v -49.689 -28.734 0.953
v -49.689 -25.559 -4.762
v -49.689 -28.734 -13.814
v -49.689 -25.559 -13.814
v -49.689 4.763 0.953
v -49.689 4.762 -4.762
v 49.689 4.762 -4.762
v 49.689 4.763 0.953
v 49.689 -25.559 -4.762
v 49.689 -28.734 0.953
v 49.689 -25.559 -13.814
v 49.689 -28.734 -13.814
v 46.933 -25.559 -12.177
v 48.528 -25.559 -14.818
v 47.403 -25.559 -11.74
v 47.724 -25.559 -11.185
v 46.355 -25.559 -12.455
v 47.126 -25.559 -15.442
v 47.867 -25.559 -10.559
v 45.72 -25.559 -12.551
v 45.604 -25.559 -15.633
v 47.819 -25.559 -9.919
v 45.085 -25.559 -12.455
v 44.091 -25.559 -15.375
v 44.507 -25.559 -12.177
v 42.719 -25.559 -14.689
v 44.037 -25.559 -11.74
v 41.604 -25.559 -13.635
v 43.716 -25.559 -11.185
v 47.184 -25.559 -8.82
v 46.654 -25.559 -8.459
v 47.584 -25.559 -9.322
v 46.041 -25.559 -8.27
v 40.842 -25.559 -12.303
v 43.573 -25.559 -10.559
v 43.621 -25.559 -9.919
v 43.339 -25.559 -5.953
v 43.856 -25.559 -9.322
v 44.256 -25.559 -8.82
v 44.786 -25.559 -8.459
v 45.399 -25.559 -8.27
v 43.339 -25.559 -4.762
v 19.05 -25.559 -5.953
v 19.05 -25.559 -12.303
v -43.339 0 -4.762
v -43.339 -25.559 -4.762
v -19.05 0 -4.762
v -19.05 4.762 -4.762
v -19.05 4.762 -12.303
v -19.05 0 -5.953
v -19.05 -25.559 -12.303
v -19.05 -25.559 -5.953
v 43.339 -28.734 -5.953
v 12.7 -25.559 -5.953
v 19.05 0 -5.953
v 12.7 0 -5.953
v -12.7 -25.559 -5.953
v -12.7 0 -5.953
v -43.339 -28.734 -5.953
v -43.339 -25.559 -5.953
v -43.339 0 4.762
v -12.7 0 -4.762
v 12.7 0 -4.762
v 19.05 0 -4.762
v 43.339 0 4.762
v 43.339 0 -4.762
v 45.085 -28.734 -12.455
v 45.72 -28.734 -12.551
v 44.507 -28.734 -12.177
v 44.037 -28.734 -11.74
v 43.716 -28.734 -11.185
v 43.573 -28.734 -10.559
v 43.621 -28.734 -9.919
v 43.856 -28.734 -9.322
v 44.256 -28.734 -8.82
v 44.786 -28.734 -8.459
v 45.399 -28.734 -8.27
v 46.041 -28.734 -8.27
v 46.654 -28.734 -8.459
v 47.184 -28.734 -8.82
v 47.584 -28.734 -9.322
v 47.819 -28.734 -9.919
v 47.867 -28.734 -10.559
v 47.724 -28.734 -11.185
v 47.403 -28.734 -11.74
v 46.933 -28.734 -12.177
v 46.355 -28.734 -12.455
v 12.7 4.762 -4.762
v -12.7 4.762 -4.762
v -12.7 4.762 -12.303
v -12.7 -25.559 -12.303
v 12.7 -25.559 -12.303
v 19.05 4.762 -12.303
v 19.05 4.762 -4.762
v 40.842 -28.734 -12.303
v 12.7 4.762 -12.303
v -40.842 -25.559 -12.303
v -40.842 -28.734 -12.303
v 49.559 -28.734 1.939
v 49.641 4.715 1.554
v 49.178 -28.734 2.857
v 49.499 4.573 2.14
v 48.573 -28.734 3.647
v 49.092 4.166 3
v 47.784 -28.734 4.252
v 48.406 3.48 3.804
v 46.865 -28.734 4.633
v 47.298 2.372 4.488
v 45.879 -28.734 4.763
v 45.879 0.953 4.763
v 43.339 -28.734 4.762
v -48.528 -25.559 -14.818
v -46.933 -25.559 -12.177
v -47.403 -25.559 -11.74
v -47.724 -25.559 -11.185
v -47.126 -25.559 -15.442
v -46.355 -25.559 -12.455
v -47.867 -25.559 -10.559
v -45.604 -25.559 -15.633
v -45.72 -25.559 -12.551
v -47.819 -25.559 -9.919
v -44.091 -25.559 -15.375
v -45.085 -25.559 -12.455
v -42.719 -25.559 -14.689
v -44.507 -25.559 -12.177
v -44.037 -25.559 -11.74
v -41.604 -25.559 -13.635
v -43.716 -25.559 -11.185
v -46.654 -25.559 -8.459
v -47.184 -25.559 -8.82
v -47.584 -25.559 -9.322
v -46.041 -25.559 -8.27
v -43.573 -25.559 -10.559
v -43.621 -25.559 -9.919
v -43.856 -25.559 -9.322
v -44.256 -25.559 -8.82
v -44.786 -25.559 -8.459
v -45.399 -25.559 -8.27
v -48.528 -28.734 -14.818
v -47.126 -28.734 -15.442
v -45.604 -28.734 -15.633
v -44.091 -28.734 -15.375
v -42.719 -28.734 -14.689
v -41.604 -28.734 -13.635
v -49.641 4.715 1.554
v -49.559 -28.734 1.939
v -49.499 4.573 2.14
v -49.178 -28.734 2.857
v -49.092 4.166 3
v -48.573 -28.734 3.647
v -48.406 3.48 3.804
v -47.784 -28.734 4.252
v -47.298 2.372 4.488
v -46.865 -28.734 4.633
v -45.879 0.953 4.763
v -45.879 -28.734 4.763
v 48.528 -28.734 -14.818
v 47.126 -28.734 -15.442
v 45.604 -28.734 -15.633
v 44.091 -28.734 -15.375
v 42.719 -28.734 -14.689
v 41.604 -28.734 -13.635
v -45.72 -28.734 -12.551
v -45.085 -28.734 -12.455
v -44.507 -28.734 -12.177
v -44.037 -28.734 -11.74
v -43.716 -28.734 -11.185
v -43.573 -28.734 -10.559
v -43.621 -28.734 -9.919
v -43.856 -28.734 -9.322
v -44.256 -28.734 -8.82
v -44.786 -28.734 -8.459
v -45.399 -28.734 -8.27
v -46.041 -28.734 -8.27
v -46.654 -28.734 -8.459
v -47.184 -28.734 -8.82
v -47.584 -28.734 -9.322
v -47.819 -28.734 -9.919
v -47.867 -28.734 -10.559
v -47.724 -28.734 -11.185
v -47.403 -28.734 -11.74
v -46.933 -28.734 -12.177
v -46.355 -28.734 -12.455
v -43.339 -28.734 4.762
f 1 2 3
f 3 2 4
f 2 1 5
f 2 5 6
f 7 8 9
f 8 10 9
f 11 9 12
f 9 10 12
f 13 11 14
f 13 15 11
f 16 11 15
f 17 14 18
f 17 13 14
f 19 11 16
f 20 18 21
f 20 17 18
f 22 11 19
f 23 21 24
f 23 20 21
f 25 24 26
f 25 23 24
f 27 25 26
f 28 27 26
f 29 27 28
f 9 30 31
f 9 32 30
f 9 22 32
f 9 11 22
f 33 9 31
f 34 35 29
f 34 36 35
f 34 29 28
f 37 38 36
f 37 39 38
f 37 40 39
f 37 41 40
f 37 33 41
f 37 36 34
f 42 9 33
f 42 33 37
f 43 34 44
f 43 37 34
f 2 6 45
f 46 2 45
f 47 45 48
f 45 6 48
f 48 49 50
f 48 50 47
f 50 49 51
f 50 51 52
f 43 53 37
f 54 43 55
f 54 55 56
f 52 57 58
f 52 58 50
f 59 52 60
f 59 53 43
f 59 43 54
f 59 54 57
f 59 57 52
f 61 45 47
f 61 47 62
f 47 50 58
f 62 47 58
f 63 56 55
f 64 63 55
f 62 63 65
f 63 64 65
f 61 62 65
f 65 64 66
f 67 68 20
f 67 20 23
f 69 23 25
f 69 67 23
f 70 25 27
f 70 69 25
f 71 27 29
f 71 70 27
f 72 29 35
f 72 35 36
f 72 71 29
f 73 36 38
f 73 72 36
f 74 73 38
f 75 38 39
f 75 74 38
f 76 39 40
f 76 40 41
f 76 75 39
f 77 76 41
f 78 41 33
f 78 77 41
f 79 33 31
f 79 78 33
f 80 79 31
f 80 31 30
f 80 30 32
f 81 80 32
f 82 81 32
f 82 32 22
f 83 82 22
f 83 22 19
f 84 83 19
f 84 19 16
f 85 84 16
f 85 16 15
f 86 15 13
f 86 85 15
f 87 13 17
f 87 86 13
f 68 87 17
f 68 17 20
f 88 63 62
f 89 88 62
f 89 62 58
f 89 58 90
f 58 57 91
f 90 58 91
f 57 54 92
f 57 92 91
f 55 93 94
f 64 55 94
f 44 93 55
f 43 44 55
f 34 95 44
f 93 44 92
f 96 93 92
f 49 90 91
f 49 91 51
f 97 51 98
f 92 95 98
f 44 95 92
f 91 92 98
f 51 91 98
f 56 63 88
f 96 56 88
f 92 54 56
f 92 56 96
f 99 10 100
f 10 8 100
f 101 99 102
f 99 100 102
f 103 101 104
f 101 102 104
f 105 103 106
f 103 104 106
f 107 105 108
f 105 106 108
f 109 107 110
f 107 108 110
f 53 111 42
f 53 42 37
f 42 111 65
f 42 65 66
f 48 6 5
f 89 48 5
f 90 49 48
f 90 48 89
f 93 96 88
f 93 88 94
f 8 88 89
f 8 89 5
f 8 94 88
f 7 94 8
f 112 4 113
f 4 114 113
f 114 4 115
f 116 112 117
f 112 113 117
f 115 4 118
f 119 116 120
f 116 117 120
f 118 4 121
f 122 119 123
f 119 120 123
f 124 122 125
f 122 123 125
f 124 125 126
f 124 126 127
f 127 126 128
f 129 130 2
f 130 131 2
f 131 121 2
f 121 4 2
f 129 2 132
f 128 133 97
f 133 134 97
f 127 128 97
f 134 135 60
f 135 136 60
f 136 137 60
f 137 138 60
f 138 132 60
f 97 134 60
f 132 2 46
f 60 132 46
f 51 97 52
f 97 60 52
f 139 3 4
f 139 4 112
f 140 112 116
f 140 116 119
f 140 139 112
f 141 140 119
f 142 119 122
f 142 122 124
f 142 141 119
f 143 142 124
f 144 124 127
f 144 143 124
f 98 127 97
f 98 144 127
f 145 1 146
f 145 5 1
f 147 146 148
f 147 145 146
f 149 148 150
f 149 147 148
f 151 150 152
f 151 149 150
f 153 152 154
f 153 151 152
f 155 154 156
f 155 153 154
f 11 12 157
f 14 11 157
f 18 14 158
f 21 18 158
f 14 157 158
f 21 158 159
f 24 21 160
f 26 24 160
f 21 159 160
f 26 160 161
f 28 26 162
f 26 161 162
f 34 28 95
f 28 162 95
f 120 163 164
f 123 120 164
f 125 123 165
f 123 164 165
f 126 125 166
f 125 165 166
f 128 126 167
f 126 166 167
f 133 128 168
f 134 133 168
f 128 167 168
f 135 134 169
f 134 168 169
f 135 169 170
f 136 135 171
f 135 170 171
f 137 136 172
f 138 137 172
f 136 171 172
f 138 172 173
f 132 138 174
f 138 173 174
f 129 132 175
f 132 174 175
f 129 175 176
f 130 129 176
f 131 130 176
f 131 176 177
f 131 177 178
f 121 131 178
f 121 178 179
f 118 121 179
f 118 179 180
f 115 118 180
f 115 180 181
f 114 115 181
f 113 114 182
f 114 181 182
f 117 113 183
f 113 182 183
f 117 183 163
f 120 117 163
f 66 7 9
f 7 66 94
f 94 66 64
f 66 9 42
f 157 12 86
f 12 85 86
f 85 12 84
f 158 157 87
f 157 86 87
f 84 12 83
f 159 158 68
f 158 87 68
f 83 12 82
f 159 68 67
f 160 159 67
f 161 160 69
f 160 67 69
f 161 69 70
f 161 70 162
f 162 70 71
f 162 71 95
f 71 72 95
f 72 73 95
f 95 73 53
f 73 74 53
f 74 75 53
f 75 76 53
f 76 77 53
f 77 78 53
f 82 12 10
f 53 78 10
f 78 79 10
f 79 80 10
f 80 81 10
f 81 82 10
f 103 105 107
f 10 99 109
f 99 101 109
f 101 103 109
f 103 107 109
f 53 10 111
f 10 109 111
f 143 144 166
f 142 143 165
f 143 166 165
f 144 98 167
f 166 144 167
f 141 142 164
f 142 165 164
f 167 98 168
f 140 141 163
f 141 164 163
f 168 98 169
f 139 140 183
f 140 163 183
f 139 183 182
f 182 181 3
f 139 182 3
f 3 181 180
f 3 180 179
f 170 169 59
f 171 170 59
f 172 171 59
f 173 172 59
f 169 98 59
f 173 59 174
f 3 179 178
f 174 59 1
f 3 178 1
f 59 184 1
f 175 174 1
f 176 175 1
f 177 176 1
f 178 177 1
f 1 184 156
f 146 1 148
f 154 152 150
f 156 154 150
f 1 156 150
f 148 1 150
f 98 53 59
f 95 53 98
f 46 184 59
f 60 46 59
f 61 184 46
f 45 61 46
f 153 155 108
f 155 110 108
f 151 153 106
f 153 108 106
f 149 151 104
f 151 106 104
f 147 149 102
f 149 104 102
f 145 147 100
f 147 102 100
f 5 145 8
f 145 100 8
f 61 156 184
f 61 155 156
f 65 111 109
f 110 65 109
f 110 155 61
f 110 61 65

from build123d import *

# Parameters (mm, degrees)
BOSS_EXTRUDE1_DEPTH = 4.7625
SKETCH1_3_W         = 6.35
SKETCH1_3_H         = 9.525
SKETCH1_3_H_2       = 6.35
BOSS_EXTRUDE2_DEPTH = 28.73375
SKETCH2_W           = 12.7
SKETCH2_H           = 6.35
SKETCH2_R           = 2.15265
BOSS_EXTRUDE3_DEPTH = 3.175
FILLET11_R          = 3.81


with BuildPart() as part:
    # Sketch1 → Boss-Extrude1 (new body)
    with BuildSketch(Plane(origin=(0, 0, 0), x_dir=(1, 0, 0), z_dir=(0, 1, 0))):
        Polygon((-49.68875, 4.7625), (-49.68875, -4.7625), (49.68875, -4.7625), (49.68875, 4.7625), (-12.7, 4.7625), (-12.7, 12.303125), (-19.05, 12.303125), (-19.05, 4.7625), align=None)
    extrude(amount=BOSS_EXTRUDE1_DEPTH)

    # Sketch1<3> → Boss-Extrude2 (add)
    with BuildSketch(Plane(origin=(0, 0, 0), x_dir=(1, 0, 0), z_dir=(0, 1, 0))):
        with Locations((-46.51375, 0)):
            Rectangle(SKETCH1_3_W, SKETCH1_3_H)
        with Locations((46.51375, 0)):
            Rectangle(SKETCH1_3_W, SKETCH1_3_H)
        with Locations((-15.875, 9.128125)):
            Rectangle(SKETCH1_3_W, SKETCH1_3_H_2)
    extrude(amount=-BOSS_EXTRUDE2_DEPTH)

    # Mirror1: part across plane


with BuildPart() as part_1:
    add(part.part)
    add(part.part.mirror(Plane(origin=(0, 0, 0), x_dir=(0, 0, 1), z_dir=(1, 0, 0))))

    # Sketch2 → Boss-Extrude3 (add)
    # profile 1 of 2: a face of its own
    with BuildSketch(Plane.XZ.offset(28.73375)):
        with Locations((-6.35, -9.128125)):
            Rectangle(SKETCH2_W, SKETCH2_H)
    # profile 2 of 2: a face of its own
    with BuildSketch(Plane.XZ.offset(28.73375)):
        with BuildLine():
            Line((-49.68875, 4.7625), (-49.68875, -13.814359467))
            ThreePointArc((-49.68875, -13.814359467), (-44.838220371, -15.559917245), (-40.842233144, -12.303125))
            Line((-40.842233144, -12.303125), (-15.875, -12.303125))
            Line((-15.875, -12.303125), (-15.875, -5.953125))
            Line((-15.875, -5.953125), (-43.33875, -5.953125))
            Line((-43.33875, -5.953125), (-43.33875, 4.7625))
            Line((-43.33875, 4.7625), (-49.68875, 4.7625))
        make_face()
        with Locations((-45.72, -10.398125)):
            Circle(SKETCH2_R, mode=Mode.SUBTRACT)
    boss_extrude3 = extrude(amount=-BOSS_EXTRUDE3_DEPTH)

    # Mirror3: Boss-Extrude3 across plane
    add(boss_extrude3.mirror(Plane(origin=(0, 0, 0), x_dir=(0, 0, 1), z_dir=(1, 0, 0))))

    # Fillet11
    fillet11_edges = [part_1.edges().sort_by_distance(p)[0] for p in [
        (49.68875, -11.985625, 4.7625),
        (-49.68875, -11.985625, 4.7625),
        (0, 4.7625, 4.7625),
    ]]
    fillet(fillet11_edges, radius=FILLET11_R)


solid = part_1.part
